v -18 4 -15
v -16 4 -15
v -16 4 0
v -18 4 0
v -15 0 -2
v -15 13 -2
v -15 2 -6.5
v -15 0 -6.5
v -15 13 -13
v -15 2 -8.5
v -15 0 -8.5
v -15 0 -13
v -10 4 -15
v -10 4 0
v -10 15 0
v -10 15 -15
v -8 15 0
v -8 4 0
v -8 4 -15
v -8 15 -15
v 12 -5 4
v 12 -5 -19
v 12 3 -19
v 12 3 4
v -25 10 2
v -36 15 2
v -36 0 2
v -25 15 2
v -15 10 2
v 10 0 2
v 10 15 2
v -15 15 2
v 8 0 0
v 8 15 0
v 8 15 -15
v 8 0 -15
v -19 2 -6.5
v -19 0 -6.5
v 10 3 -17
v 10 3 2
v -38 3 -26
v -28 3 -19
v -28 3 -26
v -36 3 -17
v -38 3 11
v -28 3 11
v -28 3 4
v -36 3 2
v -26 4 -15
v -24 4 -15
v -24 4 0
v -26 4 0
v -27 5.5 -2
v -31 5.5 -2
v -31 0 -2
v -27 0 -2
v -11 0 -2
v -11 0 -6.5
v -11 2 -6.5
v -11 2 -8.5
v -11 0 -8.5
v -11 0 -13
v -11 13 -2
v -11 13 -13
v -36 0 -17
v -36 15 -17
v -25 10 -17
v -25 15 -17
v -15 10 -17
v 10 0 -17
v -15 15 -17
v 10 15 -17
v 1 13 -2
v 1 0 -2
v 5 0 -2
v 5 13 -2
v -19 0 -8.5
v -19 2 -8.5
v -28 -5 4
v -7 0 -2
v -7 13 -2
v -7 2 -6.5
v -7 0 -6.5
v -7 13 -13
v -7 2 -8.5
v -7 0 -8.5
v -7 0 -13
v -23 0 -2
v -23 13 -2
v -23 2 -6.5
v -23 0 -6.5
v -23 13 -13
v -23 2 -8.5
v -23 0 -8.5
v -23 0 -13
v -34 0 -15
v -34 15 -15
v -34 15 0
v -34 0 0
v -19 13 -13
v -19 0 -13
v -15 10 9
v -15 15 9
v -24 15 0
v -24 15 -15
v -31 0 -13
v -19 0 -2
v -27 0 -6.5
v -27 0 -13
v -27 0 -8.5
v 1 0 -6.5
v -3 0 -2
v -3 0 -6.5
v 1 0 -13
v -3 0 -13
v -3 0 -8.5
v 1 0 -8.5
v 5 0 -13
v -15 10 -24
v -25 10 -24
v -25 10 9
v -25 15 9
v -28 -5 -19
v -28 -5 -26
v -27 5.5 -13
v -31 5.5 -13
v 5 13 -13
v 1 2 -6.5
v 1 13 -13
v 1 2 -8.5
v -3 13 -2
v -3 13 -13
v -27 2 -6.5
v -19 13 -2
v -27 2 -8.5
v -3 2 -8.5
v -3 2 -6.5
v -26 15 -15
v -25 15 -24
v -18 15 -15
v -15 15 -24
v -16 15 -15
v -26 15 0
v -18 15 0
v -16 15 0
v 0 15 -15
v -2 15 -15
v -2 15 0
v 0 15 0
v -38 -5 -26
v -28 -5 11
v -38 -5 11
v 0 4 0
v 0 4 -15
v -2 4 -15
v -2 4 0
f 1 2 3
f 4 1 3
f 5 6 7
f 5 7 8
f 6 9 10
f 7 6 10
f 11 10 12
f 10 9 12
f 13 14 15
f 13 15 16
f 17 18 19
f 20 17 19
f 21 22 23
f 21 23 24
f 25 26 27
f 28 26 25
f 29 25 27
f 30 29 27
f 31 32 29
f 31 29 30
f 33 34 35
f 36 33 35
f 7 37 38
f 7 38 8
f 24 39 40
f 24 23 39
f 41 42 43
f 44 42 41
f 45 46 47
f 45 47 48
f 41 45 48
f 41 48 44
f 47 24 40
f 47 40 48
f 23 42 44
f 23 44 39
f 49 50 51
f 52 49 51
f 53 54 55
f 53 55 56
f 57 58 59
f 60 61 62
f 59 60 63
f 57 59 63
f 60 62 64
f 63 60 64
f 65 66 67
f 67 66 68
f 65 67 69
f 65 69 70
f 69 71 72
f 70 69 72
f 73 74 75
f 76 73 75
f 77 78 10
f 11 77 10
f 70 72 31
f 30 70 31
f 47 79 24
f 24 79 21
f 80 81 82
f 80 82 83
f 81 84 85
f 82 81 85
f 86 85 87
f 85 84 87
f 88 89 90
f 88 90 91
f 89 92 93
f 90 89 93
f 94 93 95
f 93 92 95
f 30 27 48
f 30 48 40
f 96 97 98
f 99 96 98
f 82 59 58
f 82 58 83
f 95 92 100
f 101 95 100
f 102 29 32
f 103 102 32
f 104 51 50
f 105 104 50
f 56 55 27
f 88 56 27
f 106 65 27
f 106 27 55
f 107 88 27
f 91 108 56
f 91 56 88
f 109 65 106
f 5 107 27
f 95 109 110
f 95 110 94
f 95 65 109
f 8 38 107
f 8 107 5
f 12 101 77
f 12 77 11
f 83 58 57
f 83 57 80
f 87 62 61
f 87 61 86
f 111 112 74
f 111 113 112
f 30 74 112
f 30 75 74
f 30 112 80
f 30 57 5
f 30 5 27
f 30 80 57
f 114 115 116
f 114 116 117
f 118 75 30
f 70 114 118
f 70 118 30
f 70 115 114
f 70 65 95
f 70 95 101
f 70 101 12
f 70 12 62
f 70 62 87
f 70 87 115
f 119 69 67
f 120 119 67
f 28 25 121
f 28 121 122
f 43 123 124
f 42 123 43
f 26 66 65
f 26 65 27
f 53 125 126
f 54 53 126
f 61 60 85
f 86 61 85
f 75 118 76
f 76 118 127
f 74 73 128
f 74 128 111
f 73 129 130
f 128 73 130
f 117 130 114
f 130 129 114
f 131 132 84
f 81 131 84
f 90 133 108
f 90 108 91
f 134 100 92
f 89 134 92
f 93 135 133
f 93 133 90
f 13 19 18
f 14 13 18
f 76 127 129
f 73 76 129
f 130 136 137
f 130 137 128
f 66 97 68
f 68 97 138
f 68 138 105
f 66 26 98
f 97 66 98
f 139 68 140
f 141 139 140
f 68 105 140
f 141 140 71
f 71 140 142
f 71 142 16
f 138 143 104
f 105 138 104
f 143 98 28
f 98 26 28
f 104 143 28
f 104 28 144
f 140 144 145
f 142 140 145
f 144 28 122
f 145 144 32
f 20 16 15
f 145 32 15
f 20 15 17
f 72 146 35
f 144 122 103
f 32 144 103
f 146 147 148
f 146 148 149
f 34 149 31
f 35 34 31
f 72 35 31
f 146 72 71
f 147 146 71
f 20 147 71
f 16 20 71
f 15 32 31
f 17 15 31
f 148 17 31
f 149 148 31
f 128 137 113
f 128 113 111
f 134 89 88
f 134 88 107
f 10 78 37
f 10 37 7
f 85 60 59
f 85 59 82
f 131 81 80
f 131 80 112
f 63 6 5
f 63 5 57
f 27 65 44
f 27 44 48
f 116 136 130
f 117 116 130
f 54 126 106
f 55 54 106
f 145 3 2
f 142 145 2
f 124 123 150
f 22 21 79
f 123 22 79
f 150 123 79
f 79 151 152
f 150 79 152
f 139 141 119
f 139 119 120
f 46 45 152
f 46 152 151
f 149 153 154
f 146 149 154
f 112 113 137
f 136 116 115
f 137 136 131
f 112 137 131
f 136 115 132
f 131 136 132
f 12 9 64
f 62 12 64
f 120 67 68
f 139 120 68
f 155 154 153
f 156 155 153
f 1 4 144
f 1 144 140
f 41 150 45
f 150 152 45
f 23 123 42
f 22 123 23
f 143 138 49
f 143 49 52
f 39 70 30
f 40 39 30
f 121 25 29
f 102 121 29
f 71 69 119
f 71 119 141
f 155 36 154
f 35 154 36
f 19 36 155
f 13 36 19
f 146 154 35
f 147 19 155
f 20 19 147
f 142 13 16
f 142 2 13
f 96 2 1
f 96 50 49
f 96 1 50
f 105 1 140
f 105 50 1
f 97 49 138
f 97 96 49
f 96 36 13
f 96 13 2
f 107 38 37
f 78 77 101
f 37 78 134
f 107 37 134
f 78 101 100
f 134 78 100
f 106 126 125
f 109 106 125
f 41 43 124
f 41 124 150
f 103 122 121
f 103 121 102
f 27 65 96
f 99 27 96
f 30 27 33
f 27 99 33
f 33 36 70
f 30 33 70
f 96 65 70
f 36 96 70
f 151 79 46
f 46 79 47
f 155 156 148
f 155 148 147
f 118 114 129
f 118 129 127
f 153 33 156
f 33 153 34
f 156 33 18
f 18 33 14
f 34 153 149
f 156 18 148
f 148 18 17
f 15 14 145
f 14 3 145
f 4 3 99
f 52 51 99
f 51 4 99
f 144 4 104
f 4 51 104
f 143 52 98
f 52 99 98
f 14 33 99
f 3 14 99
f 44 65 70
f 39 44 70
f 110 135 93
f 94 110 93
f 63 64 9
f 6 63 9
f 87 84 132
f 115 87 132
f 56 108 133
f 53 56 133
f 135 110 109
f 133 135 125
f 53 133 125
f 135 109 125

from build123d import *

# Parameters (mm, degrees)
SKETCH1_W                = 6
SKETCH1_H                = 15
BOSS_EXTRUDE1_DEPTH      = 15
SKETCH2_W                = 4
SKETCH2_H                = 11
CUT_EXTRUDE1_DEPTH       = 13
SKETCH3_W                = 15
SKETCH3_H                = 4
BOSS_EXTRUDE2_DEPTH      = 2
LPATTERN1_COUNT          = 4
LPATTERN1_PITCH          = 8
SKETCH4_W                = 15
SKETCH4_H                = 15
BOSS_EXTRUDE3_DEPTH      = 8
SKETCH5_W                = 4
SKETCH5_H                = 11
CUT_EXTRUDE2_DEPTH       = 5.5
SKETCH6_W                = 15
SKETCH6_H                = 15
BOSS_EXTRUDE4_DEPTH      = 2
SKETCH7_W                = 36
SKETCH7_H                = 2
CUT_EXTRUDE3_DEPTH       = 2
BOSS_EXTRUDE5_DEPTH      = 5
BOSS_EXTRUDE5_DEPTH_BACK = 15
SKETCH8_W                = 35
SKETCH8_H                = 19
BOSS_EXTRUDE6_DEPTH      = 5
BOSS_EXTRUDE6_DEPTH_BACK = 15
SKETCH9_W                = 11
SKETCH9_H                = 19
SPLIT1_START             = -5
SPLIT1_OUTLINE_W         = 46
SPLIT1_OUTLINE_H         = 19
SPLIT1_DEPTH             = 5
SPLIT1_2_OUTLINE_W       = 4
SPLIT1_2_OUTLINE_H       = 11
SPLIT1_2_DEPTH           = 13
SPLIT1_3_OUTLINE_W       = 4
SPLIT1_3_OUTLINE_H       = 2
SPLIT1_3_DEPTH           = 2
SPLIT1_START_2           = -13
SPLIT1_4_DEPTH           = 11
SPLIT1_START_3           = -17
SPLIT1_5_OUTLINE_W       = 46
SPLIT1_5_OUTLINE_H       = 5
SPLIT1_5_DEPTH           = 19
SPLIT1_START_4           = -8.5
SPLIT1_6_OUTLINE_W       = 4
SPLIT1_6_OUTLINE_H       = 2
SPLIT1_6_DEPTH           = 2
SKETCH15_W               = 10
SKETCH15_H               = 5
BOSS_EXTRUDE13_DEPTH     = 7
SKETCH16_W               = 10
SKETCH16_H               = 5
BOSS_EXTRUDE14_DEPTH     = 7
SKETCH17_W               = 50
SKETCH17_H               = 23
SKETCH17_W_2             = 46
SKETCH17_H_2             = 19
BOSS_EXTRUDE15_DEPTH     = 8
SKETCH18_W               = 10
SKETCH18_H               = 8
BOSS_EXTRUDE16_DEPTH     = 7
SKETCH19_W               = 10
SKETCH19_H               = 8
BOSS_EXTRUDE17_DEPTH     = 7


# Read off the part's stored shape, not the designer's step: Split1
with BuildPart() as part:
    # Sketch1 → Boss-Extrude1 (new body)
    with BuildSketch(Plane(origin=(0, 0, 0), x_dir=(1, 0, 0), z_dir=(0, 1, 0))):
        with Locations((3, 7.5)):
            Rectangle(SKETCH1_W, SKETCH1_H)
    extrude(amount=BOSS_EXTRUDE1_DEPTH)

    # Sketch2 → Cut-Extrude1 (cut)
    with BuildSketch(Plane.XZ):
        with Locations((3, -7.5)):
            Rectangle(SKETCH2_W, SKETCH2_H)
    extrude(amount=-CUT_EXTRUDE1_DEPTH, mode=Mode.SUBTRACT)

    # Sketch3 → Boss-Extrude2 (add)
    with BuildSketch(Plane.ZY):
        with Locations((-7.5, 2)):
            Rectangle(SKETCH3_W, SKETCH3_H)
    extrude(amount=BOSS_EXTRUDE2_DEPTH)


with BuildPart() as lpattern1_1:
    # LPattern1: pattern copy
    add(part.part.moved(Location(Vector(-1, 0, 0) * (1 * LPATTERN1_PITCH))))


with BuildPart() as lpattern1_2:
    # LPattern1: pattern copy
    add(part.part.moved(Location(Vector(-1, 0, 0) * (2 * LPATTERN1_PITCH))))


with BuildPart() as lpattern1_3:
    # LPattern1: pattern copy
    add(part.part.moved(Location(Vector(-1, 0, 0) * (3 * LPATTERN1_PITCH))))

    # Sketch4 → Boss-Extrude3 (add)
    with BuildSketch(Plane.ZY.offset(26)):
        with Locations((-7.5, 7.5)):
            Rectangle(SKETCH4_W, SKETCH4_H)
    extrude(amount=BOSS_EXTRUDE3_DEPTH)

    # Sketch5 → Cut-Extrude2 (cut)
    with BuildSketch(Plane.XZ):
        with Locations((-29, -7.5)):
            Rectangle(SKETCH5_W, SKETCH5_H)
    extrude(amount=-CUT_EXTRUDE2_DEPTH, mode=Mode.SUBTRACT)


with BuildPart() as lpattern1_1_1:
    add(lpattern1_1.part)

    # Combine1: union LPattern1_2, LPattern1_3, part
    add(lpattern1_2.part)
    add(lpattern1_3.part)
    add(part.part)

    # Sketch6 → Boss-Extrude4 (add)
    with BuildSketch(Plane(origin=(6, 0, 0), x_dir=(0, 0, -1), z_dir=(1, 0, 0))):
        with Locations((7.5, 7.5)):
            Rectangle(SKETCH6_W, SKETCH6_H)
    extrude(amount=BOSS_EXTRUDE4_DEPTH)

    # Sketch7 → Cut-Extrude3 (cut)
    with BuildSketch(Plane.XZ):
        with Locations((-13, -7.5)):
            Rectangle(SKETCH7_W, SKETCH7_H)
    extrude(amount=-CUT_EXTRUDE3_DEPTH, mode=Mode.SUBTRACT)


with BuildPart() as body_2:
    # Sketch8 → Boss-Extrude5 (new, two sides: drawn at the far end of the back side and taken through both)
    with BuildSketch(Plane.XZ.offset(-BOSS_EXTRUDE5_DEPTH_BACK)):
        with Locations((-7.5, -7.5)):
            Rectangle(SKETCH8_W, SKETCH8_H)
    extrude(amount=BOSS_EXTRUDE5_DEPTH + BOSS_EXTRUDE5_DEPTH_BACK)


with BuildPart() as body_3:
    # Sketch9 → Boss-Extrude6 (new, two sides: drawn at the far end of the back side and taken through both)
    with BuildSketch(Plane.XZ.offset(-BOSS_EXTRUDE6_DEPTH_BACK)):
        with Locations((-30.5, -7.5)):
            Rectangle(SKETCH9_W, SKETCH9_H)
    extrude(amount=BOSS_EXTRUDE6_DEPTH + BOSS_EXTRUDE6_DEPTH_BACK)


with BuildPart() as body_2_1:
    add(body_2.part)

    # Combine3: union body 3
    add(body_3.part)

    # Combine4: cut LPattern1_1
    add(lpattern1_1_1.part, mode=Mode.SUBTRACT)

    # Split1 outline → Split1 (cut)
    with BuildSketch(Plane(origin=(0, 0, 0), x_dir=(1, 0, 0), z_dir=(0, 1, 0)).offset(SPLIT1_START)):
        with Locations((-13, 7.5)):
            Rectangle(SPLIT1_OUTLINE_W, SPLIT1_OUTLINE_H)
    extrude(amount=SPLIT1_DEPTH, mode=Mode.SUBTRACT)

    # Split1 2 outline → Split1 2 (cut)
    with BuildSketch(Plane(origin=(0, 0, 0), x_dir=(1, 0, 0), z_dir=(0, 1, 0))):
        with Locations((-5, 7.5)):
            Rectangle(SPLIT1_2_OUTLINE_W, SPLIT1_2_OUTLINE_H)
        with Locations((3, 7.5)):
            Rectangle(SPLIT1_2_OUTLINE_W, SPLIT1_2_OUTLINE_H)
        with Locations((-13, 7.5)):
            Rectangle(SPLIT1_2_OUTLINE_W, SPLIT1_2_OUTLINE_H)
        with Locations((-21, 7.5)):
            Rectangle(SPLIT1_2_OUTLINE_W, SPLIT1_2_OUTLINE_H)
        with Locations((-29, 7.5)):
            Rectangle(SPLIT1_2_OUTLINE_W, SPLIT1_2_OUTLINE_H)
    extrude(amount=SPLIT1_2_DEPTH, mode=Mode.SUBTRACT)

    # Split1 3 outline → Split1 3 (cut)
    with BuildSketch(Plane(origin=(0, 0, 0), x_dir=(1, 0, 0), z_dir=(0, 1, 0))):
        with Locations((-1, 7.5)):
            Rectangle(SPLIT1_3_OUTLINE_W, SPLIT1_3_OUTLINE_H)
        with Locations((-9, 7.5)):
            Rectangle(SPLIT1_3_OUTLINE_W, SPLIT1_3_OUTLINE_H)
        with Locations((-17, 7.5)):
            Rectangle(SPLIT1_3_OUTLINE_W, SPLIT1_3_OUTLINE_H)
        with Locations((-25, 7.5)):
            Rectangle(SPLIT1_3_OUTLINE_W, SPLIT1_3_OUTLINE_H)
    extrude(amount=SPLIT1_3_DEPTH, mode=Mode.SUBTRACT)

    # Sketch15 → Boss-Extrude13 (add)
    with BuildSketch(Plane.XY.offset(2)):
        with Locations((-20, 12.5)):
            Rectangle(SKETCH15_W, SKETCH15_H)
    extrude(amount=BOSS_EXTRUDE13_DEPTH)

    # Sketch16 → Boss-Extrude14 (add)
    with BuildSketch(Plane(origin=(0, 0, -17), x_dir=(-1, 0, 0), z_dir=(0, 0, -1))):
        with Locations((20, 12.5)):
            Rectangle(SKETCH16_W, SKETCH16_H)
    extrude(amount=BOSS_EXTRUDE14_DEPTH)


with BuildPart() as body_2_2:
    # Split1 4 outline → Split1 4 (new body)
    with BuildSketch(Plane.XY.offset(SPLIT1_START_2)):
        Polygon((-27, 5.5), (-31, 5.5), (-31, 0), (-36, 0), (-36, -5), (10, -5), (10, 0), (5, 0), (5, 13), (1, 13), (1, 0), (-3, 0), (-3, 13), (-7, 13), (-7, 0), (-11, 0), (-11, 13), (-15, 13), (-15, 0), (-19, 0), (-19, 13), (-23, 13), (-23, 0), (-27, 0), align=None)
    extrude(amount=SPLIT1_4_DEPTH)

    # Split1 5 outline → Split1 5 (add)
    with BuildSketch(Plane.XY.offset(SPLIT1_START_3)):
        with Locations((-13, -2.5)):
            Rectangle(SPLIT1_5_OUTLINE_W, SPLIT1_5_OUTLINE_H)
    extrude(amount=SPLIT1_5_DEPTH)

    # Split1 6 outline → Split1 6 (add)
    with BuildSketch(Plane.XY.offset(SPLIT1_START_4)):
        with Locations((-25, 1)):
            Rectangle(SPLIT1_6_OUTLINE_W, SPLIT1_6_OUTLINE_H)
        with Locations((-17, 1)):
            Rectangle(SPLIT1_6_OUTLINE_W, SPLIT1_6_OUTLINE_H)
        with Locations((-9, 1)):
            Rectangle(SPLIT1_6_OUTLINE_W, SPLIT1_6_OUTLINE_H)
        with Locations((-1, 1)):
            Rectangle(SPLIT1_6_OUTLINE_W, SPLIT1_6_OUTLINE_H)
    extrude(amount=SPLIT1_6_DEPTH)

    # Sketch17 → Boss-Extrude15 (add)
    with BuildSketch(Plane.XZ.offset(5)):
        with Locations((-13, -7.5)):
            Rectangle(SKETCH17_W, SKETCH17_H)
        with Locations((-13, -7.5)):
            Rectangle(SKETCH17_W_2, SKETCH17_H_2, mode=Mode.SUBTRACT)
    extrude(amount=-BOSS_EXTRUDE15_DEPTH)

    # Sketch18 → Boss-Extrude16 (add)
    with BuildSketch(Plane.XY.offset(4)):
        with Locations((-33, -1)):
            Rectangle(SKETCH18_W, SKETCH18_H)
    extrude(amount=BOSS_EXTRUDE16_DEPTH)

    # Sketch19 → Boss-Extrude17 (add)
    with BuildSketch(Plane(origin=(0, 0, -19), x_dir=(-1, 0, 0), z_dir=(0, 0, -1))):
        with Locations((33, -1)):
            Rectangle(SKETCH19_W, SKETCH19_H)
    extrude(amount=BOSS_EXTRUDE17_DEPTH)


solid = Compound([body_2_1.part, body_2_2.part])
